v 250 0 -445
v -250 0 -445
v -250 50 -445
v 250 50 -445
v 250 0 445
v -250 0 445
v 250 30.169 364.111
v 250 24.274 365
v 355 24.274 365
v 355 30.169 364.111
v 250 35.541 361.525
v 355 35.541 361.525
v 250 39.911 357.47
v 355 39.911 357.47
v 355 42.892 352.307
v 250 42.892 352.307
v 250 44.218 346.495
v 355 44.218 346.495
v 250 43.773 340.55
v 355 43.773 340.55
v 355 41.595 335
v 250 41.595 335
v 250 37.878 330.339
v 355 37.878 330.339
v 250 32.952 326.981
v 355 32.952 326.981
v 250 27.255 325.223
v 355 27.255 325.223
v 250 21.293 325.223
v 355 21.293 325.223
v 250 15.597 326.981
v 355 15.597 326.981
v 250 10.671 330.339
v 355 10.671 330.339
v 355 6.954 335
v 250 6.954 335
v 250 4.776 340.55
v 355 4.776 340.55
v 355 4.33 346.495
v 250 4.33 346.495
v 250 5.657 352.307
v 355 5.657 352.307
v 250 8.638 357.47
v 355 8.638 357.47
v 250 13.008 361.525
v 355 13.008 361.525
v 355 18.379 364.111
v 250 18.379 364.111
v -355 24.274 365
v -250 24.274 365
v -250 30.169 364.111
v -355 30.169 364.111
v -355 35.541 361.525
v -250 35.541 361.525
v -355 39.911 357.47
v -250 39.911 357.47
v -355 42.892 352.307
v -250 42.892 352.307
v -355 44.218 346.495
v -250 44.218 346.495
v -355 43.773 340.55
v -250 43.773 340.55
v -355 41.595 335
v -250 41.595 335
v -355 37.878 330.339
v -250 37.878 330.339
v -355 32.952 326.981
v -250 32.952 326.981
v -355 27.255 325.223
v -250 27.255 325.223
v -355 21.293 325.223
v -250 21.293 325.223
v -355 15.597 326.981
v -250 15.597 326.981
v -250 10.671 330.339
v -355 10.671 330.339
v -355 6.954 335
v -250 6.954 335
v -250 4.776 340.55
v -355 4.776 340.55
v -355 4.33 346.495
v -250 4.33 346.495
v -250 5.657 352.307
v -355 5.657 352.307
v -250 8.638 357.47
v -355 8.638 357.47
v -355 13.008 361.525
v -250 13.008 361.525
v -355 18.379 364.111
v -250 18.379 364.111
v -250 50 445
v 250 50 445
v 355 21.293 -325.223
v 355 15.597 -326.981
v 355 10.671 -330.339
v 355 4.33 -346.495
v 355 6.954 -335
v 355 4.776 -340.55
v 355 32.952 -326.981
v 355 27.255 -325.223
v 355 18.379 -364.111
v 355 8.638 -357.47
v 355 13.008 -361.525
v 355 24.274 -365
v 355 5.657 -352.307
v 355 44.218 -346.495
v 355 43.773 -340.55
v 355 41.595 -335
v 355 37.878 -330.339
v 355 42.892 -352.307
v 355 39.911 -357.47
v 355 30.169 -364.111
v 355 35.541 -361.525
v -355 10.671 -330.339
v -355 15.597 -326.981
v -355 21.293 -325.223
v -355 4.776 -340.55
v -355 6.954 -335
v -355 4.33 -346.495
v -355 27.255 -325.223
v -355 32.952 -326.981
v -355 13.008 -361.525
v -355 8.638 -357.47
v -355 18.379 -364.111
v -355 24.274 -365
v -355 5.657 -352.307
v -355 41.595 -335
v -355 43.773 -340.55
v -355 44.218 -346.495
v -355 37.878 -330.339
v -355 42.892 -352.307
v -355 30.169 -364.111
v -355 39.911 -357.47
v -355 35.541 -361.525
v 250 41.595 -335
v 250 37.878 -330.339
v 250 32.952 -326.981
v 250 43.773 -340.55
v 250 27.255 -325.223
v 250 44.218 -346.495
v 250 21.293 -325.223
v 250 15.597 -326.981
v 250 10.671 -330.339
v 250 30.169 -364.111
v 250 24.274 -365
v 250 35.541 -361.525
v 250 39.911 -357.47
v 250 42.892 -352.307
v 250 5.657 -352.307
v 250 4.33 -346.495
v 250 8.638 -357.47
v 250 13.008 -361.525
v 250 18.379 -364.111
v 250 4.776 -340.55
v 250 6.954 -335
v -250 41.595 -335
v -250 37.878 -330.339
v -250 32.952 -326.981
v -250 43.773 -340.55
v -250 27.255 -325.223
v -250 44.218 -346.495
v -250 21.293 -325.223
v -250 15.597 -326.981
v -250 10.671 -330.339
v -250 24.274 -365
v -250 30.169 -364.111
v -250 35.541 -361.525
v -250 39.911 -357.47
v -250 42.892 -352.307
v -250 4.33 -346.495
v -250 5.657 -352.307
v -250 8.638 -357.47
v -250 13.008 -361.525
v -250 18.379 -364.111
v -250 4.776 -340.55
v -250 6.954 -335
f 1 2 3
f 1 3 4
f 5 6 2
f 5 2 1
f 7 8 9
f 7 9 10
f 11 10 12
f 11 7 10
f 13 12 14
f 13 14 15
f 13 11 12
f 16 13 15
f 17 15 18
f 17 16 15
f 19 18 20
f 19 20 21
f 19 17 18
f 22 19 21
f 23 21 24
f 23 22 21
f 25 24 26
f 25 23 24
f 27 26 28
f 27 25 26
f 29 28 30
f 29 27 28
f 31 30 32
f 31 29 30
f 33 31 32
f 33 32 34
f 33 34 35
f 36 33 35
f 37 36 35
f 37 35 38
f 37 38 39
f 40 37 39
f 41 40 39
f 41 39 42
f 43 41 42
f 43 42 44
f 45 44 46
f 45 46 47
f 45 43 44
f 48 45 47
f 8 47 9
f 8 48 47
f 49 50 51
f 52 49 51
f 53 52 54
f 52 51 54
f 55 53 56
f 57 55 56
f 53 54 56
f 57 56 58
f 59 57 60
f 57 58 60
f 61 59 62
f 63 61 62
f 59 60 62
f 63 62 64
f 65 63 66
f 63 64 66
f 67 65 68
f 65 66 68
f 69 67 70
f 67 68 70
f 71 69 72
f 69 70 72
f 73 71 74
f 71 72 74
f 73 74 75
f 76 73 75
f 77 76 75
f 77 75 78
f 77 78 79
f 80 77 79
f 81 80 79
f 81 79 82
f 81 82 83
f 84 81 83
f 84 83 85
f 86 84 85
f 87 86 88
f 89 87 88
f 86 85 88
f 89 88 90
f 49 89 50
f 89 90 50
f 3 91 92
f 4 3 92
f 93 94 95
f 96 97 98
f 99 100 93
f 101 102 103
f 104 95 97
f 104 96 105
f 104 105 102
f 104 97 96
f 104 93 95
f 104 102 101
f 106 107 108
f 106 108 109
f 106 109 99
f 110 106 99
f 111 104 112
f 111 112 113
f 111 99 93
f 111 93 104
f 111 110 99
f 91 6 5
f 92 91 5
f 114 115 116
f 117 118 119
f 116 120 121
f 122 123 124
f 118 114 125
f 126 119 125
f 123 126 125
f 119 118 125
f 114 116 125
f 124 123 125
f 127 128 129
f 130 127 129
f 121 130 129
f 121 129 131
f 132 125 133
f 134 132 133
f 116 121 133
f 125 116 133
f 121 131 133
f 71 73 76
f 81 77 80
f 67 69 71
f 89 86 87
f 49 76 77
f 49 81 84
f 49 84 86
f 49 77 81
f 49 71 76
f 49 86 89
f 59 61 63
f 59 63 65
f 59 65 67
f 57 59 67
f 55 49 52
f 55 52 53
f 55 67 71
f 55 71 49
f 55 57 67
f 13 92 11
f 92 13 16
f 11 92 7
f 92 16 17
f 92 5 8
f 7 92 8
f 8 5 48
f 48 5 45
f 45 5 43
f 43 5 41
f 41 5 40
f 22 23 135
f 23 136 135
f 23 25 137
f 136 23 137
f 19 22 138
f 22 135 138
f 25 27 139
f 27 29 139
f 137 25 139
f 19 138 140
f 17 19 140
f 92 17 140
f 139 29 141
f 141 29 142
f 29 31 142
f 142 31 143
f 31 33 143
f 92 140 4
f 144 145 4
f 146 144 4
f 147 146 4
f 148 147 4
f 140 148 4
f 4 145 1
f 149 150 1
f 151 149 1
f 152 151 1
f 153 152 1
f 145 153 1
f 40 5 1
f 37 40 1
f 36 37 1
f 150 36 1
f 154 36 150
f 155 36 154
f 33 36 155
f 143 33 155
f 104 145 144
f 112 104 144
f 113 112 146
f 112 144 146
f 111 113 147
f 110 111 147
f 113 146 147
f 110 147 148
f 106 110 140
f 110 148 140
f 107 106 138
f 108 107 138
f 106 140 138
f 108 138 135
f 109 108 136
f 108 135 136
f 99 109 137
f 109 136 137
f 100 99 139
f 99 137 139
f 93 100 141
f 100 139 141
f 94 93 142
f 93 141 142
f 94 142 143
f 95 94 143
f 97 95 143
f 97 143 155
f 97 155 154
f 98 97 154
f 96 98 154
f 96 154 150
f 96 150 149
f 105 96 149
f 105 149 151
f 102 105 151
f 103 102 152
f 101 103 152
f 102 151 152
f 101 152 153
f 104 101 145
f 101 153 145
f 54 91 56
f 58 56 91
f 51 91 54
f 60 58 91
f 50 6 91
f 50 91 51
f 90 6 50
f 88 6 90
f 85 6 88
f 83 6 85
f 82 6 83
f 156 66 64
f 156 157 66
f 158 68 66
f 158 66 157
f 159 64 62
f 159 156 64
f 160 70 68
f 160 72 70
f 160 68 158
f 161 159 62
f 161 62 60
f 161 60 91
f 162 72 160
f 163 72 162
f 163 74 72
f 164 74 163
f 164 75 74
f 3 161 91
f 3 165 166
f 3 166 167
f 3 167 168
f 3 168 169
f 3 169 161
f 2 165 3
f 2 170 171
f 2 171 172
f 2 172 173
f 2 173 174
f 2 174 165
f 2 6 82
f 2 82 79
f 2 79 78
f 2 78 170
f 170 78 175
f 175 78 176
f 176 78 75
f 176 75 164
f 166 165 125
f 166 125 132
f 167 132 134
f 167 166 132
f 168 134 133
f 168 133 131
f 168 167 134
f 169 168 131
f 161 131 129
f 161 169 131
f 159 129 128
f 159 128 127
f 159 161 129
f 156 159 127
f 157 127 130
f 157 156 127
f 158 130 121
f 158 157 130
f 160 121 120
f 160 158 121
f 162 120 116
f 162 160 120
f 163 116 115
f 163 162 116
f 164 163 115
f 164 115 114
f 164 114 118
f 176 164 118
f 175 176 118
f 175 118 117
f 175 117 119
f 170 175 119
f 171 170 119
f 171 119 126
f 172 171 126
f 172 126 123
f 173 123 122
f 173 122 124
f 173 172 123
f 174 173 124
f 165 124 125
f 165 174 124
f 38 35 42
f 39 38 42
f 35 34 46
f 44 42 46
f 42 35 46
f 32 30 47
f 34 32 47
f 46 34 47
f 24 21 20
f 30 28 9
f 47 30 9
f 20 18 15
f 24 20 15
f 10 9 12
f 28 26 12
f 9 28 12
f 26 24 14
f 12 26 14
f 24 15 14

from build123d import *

# Parameters (mm, degrees)
SKETCH1_W               = 500
SKETCH1_H               = 890
BOSS_EXTRUDE1_DEPTH     = 50
SKETCH2_R               = 20
BOSS_EXTRUDE2_DEPTH     = 105
MIRROR2_COPY_1_SKETCH_R = 20
MIRROR2_COPY_1_DEPTH    = 105


with BuildPart() as part:
    # Sketch1 → Boss-Extrude1 (new body)
    with BuildSketch(Plane(origin=(0, 0, 0), x_dir=(1, 0, 0), z_dir=(0, 1, 0))):
        Rectangle(SKETCH1_W, SKETCH1_H)
    extrude(amount=BOSS_EXTRUDE1_DEPTH)

    # Sketch2 → Boss-Extrude2 (add)
    with BuildSketch(Plane(origin=(250, 0, 0), x_dir=(0, 0, -1), z_dir=(1, 0, 0))):
        with Locations((345, 24.274325974)):
            Circle(SKETCH2_R)
    boss_extrude2 = extrude(amount=BOSS_EXTRUDE2_DEPTH)

    # Mirror1: Boss-Extrude2 across plane
    add(boss_extrude2.mirror(Plane.XY))

    # Mirror2: Boss-Extrude2 across plane
    add(boss_extrude2.mirror(Plane(origin=(0, 0, 0), x_dir=(0, 0, 1), z_dir=(1, 0, 0))))

    # Mirror2 copy 1 sketch → Mirror2 copy 1 (add)
    with BuildSketch(Plane.ZY.offset(250)):
        with Locations((345, 24.274325974)):
            Circle(MIRROR2_COPY_1_SKETCH_R)
    extrude(amount=MIRROR2_COPY_1_DEPTH)


solid = part.part
